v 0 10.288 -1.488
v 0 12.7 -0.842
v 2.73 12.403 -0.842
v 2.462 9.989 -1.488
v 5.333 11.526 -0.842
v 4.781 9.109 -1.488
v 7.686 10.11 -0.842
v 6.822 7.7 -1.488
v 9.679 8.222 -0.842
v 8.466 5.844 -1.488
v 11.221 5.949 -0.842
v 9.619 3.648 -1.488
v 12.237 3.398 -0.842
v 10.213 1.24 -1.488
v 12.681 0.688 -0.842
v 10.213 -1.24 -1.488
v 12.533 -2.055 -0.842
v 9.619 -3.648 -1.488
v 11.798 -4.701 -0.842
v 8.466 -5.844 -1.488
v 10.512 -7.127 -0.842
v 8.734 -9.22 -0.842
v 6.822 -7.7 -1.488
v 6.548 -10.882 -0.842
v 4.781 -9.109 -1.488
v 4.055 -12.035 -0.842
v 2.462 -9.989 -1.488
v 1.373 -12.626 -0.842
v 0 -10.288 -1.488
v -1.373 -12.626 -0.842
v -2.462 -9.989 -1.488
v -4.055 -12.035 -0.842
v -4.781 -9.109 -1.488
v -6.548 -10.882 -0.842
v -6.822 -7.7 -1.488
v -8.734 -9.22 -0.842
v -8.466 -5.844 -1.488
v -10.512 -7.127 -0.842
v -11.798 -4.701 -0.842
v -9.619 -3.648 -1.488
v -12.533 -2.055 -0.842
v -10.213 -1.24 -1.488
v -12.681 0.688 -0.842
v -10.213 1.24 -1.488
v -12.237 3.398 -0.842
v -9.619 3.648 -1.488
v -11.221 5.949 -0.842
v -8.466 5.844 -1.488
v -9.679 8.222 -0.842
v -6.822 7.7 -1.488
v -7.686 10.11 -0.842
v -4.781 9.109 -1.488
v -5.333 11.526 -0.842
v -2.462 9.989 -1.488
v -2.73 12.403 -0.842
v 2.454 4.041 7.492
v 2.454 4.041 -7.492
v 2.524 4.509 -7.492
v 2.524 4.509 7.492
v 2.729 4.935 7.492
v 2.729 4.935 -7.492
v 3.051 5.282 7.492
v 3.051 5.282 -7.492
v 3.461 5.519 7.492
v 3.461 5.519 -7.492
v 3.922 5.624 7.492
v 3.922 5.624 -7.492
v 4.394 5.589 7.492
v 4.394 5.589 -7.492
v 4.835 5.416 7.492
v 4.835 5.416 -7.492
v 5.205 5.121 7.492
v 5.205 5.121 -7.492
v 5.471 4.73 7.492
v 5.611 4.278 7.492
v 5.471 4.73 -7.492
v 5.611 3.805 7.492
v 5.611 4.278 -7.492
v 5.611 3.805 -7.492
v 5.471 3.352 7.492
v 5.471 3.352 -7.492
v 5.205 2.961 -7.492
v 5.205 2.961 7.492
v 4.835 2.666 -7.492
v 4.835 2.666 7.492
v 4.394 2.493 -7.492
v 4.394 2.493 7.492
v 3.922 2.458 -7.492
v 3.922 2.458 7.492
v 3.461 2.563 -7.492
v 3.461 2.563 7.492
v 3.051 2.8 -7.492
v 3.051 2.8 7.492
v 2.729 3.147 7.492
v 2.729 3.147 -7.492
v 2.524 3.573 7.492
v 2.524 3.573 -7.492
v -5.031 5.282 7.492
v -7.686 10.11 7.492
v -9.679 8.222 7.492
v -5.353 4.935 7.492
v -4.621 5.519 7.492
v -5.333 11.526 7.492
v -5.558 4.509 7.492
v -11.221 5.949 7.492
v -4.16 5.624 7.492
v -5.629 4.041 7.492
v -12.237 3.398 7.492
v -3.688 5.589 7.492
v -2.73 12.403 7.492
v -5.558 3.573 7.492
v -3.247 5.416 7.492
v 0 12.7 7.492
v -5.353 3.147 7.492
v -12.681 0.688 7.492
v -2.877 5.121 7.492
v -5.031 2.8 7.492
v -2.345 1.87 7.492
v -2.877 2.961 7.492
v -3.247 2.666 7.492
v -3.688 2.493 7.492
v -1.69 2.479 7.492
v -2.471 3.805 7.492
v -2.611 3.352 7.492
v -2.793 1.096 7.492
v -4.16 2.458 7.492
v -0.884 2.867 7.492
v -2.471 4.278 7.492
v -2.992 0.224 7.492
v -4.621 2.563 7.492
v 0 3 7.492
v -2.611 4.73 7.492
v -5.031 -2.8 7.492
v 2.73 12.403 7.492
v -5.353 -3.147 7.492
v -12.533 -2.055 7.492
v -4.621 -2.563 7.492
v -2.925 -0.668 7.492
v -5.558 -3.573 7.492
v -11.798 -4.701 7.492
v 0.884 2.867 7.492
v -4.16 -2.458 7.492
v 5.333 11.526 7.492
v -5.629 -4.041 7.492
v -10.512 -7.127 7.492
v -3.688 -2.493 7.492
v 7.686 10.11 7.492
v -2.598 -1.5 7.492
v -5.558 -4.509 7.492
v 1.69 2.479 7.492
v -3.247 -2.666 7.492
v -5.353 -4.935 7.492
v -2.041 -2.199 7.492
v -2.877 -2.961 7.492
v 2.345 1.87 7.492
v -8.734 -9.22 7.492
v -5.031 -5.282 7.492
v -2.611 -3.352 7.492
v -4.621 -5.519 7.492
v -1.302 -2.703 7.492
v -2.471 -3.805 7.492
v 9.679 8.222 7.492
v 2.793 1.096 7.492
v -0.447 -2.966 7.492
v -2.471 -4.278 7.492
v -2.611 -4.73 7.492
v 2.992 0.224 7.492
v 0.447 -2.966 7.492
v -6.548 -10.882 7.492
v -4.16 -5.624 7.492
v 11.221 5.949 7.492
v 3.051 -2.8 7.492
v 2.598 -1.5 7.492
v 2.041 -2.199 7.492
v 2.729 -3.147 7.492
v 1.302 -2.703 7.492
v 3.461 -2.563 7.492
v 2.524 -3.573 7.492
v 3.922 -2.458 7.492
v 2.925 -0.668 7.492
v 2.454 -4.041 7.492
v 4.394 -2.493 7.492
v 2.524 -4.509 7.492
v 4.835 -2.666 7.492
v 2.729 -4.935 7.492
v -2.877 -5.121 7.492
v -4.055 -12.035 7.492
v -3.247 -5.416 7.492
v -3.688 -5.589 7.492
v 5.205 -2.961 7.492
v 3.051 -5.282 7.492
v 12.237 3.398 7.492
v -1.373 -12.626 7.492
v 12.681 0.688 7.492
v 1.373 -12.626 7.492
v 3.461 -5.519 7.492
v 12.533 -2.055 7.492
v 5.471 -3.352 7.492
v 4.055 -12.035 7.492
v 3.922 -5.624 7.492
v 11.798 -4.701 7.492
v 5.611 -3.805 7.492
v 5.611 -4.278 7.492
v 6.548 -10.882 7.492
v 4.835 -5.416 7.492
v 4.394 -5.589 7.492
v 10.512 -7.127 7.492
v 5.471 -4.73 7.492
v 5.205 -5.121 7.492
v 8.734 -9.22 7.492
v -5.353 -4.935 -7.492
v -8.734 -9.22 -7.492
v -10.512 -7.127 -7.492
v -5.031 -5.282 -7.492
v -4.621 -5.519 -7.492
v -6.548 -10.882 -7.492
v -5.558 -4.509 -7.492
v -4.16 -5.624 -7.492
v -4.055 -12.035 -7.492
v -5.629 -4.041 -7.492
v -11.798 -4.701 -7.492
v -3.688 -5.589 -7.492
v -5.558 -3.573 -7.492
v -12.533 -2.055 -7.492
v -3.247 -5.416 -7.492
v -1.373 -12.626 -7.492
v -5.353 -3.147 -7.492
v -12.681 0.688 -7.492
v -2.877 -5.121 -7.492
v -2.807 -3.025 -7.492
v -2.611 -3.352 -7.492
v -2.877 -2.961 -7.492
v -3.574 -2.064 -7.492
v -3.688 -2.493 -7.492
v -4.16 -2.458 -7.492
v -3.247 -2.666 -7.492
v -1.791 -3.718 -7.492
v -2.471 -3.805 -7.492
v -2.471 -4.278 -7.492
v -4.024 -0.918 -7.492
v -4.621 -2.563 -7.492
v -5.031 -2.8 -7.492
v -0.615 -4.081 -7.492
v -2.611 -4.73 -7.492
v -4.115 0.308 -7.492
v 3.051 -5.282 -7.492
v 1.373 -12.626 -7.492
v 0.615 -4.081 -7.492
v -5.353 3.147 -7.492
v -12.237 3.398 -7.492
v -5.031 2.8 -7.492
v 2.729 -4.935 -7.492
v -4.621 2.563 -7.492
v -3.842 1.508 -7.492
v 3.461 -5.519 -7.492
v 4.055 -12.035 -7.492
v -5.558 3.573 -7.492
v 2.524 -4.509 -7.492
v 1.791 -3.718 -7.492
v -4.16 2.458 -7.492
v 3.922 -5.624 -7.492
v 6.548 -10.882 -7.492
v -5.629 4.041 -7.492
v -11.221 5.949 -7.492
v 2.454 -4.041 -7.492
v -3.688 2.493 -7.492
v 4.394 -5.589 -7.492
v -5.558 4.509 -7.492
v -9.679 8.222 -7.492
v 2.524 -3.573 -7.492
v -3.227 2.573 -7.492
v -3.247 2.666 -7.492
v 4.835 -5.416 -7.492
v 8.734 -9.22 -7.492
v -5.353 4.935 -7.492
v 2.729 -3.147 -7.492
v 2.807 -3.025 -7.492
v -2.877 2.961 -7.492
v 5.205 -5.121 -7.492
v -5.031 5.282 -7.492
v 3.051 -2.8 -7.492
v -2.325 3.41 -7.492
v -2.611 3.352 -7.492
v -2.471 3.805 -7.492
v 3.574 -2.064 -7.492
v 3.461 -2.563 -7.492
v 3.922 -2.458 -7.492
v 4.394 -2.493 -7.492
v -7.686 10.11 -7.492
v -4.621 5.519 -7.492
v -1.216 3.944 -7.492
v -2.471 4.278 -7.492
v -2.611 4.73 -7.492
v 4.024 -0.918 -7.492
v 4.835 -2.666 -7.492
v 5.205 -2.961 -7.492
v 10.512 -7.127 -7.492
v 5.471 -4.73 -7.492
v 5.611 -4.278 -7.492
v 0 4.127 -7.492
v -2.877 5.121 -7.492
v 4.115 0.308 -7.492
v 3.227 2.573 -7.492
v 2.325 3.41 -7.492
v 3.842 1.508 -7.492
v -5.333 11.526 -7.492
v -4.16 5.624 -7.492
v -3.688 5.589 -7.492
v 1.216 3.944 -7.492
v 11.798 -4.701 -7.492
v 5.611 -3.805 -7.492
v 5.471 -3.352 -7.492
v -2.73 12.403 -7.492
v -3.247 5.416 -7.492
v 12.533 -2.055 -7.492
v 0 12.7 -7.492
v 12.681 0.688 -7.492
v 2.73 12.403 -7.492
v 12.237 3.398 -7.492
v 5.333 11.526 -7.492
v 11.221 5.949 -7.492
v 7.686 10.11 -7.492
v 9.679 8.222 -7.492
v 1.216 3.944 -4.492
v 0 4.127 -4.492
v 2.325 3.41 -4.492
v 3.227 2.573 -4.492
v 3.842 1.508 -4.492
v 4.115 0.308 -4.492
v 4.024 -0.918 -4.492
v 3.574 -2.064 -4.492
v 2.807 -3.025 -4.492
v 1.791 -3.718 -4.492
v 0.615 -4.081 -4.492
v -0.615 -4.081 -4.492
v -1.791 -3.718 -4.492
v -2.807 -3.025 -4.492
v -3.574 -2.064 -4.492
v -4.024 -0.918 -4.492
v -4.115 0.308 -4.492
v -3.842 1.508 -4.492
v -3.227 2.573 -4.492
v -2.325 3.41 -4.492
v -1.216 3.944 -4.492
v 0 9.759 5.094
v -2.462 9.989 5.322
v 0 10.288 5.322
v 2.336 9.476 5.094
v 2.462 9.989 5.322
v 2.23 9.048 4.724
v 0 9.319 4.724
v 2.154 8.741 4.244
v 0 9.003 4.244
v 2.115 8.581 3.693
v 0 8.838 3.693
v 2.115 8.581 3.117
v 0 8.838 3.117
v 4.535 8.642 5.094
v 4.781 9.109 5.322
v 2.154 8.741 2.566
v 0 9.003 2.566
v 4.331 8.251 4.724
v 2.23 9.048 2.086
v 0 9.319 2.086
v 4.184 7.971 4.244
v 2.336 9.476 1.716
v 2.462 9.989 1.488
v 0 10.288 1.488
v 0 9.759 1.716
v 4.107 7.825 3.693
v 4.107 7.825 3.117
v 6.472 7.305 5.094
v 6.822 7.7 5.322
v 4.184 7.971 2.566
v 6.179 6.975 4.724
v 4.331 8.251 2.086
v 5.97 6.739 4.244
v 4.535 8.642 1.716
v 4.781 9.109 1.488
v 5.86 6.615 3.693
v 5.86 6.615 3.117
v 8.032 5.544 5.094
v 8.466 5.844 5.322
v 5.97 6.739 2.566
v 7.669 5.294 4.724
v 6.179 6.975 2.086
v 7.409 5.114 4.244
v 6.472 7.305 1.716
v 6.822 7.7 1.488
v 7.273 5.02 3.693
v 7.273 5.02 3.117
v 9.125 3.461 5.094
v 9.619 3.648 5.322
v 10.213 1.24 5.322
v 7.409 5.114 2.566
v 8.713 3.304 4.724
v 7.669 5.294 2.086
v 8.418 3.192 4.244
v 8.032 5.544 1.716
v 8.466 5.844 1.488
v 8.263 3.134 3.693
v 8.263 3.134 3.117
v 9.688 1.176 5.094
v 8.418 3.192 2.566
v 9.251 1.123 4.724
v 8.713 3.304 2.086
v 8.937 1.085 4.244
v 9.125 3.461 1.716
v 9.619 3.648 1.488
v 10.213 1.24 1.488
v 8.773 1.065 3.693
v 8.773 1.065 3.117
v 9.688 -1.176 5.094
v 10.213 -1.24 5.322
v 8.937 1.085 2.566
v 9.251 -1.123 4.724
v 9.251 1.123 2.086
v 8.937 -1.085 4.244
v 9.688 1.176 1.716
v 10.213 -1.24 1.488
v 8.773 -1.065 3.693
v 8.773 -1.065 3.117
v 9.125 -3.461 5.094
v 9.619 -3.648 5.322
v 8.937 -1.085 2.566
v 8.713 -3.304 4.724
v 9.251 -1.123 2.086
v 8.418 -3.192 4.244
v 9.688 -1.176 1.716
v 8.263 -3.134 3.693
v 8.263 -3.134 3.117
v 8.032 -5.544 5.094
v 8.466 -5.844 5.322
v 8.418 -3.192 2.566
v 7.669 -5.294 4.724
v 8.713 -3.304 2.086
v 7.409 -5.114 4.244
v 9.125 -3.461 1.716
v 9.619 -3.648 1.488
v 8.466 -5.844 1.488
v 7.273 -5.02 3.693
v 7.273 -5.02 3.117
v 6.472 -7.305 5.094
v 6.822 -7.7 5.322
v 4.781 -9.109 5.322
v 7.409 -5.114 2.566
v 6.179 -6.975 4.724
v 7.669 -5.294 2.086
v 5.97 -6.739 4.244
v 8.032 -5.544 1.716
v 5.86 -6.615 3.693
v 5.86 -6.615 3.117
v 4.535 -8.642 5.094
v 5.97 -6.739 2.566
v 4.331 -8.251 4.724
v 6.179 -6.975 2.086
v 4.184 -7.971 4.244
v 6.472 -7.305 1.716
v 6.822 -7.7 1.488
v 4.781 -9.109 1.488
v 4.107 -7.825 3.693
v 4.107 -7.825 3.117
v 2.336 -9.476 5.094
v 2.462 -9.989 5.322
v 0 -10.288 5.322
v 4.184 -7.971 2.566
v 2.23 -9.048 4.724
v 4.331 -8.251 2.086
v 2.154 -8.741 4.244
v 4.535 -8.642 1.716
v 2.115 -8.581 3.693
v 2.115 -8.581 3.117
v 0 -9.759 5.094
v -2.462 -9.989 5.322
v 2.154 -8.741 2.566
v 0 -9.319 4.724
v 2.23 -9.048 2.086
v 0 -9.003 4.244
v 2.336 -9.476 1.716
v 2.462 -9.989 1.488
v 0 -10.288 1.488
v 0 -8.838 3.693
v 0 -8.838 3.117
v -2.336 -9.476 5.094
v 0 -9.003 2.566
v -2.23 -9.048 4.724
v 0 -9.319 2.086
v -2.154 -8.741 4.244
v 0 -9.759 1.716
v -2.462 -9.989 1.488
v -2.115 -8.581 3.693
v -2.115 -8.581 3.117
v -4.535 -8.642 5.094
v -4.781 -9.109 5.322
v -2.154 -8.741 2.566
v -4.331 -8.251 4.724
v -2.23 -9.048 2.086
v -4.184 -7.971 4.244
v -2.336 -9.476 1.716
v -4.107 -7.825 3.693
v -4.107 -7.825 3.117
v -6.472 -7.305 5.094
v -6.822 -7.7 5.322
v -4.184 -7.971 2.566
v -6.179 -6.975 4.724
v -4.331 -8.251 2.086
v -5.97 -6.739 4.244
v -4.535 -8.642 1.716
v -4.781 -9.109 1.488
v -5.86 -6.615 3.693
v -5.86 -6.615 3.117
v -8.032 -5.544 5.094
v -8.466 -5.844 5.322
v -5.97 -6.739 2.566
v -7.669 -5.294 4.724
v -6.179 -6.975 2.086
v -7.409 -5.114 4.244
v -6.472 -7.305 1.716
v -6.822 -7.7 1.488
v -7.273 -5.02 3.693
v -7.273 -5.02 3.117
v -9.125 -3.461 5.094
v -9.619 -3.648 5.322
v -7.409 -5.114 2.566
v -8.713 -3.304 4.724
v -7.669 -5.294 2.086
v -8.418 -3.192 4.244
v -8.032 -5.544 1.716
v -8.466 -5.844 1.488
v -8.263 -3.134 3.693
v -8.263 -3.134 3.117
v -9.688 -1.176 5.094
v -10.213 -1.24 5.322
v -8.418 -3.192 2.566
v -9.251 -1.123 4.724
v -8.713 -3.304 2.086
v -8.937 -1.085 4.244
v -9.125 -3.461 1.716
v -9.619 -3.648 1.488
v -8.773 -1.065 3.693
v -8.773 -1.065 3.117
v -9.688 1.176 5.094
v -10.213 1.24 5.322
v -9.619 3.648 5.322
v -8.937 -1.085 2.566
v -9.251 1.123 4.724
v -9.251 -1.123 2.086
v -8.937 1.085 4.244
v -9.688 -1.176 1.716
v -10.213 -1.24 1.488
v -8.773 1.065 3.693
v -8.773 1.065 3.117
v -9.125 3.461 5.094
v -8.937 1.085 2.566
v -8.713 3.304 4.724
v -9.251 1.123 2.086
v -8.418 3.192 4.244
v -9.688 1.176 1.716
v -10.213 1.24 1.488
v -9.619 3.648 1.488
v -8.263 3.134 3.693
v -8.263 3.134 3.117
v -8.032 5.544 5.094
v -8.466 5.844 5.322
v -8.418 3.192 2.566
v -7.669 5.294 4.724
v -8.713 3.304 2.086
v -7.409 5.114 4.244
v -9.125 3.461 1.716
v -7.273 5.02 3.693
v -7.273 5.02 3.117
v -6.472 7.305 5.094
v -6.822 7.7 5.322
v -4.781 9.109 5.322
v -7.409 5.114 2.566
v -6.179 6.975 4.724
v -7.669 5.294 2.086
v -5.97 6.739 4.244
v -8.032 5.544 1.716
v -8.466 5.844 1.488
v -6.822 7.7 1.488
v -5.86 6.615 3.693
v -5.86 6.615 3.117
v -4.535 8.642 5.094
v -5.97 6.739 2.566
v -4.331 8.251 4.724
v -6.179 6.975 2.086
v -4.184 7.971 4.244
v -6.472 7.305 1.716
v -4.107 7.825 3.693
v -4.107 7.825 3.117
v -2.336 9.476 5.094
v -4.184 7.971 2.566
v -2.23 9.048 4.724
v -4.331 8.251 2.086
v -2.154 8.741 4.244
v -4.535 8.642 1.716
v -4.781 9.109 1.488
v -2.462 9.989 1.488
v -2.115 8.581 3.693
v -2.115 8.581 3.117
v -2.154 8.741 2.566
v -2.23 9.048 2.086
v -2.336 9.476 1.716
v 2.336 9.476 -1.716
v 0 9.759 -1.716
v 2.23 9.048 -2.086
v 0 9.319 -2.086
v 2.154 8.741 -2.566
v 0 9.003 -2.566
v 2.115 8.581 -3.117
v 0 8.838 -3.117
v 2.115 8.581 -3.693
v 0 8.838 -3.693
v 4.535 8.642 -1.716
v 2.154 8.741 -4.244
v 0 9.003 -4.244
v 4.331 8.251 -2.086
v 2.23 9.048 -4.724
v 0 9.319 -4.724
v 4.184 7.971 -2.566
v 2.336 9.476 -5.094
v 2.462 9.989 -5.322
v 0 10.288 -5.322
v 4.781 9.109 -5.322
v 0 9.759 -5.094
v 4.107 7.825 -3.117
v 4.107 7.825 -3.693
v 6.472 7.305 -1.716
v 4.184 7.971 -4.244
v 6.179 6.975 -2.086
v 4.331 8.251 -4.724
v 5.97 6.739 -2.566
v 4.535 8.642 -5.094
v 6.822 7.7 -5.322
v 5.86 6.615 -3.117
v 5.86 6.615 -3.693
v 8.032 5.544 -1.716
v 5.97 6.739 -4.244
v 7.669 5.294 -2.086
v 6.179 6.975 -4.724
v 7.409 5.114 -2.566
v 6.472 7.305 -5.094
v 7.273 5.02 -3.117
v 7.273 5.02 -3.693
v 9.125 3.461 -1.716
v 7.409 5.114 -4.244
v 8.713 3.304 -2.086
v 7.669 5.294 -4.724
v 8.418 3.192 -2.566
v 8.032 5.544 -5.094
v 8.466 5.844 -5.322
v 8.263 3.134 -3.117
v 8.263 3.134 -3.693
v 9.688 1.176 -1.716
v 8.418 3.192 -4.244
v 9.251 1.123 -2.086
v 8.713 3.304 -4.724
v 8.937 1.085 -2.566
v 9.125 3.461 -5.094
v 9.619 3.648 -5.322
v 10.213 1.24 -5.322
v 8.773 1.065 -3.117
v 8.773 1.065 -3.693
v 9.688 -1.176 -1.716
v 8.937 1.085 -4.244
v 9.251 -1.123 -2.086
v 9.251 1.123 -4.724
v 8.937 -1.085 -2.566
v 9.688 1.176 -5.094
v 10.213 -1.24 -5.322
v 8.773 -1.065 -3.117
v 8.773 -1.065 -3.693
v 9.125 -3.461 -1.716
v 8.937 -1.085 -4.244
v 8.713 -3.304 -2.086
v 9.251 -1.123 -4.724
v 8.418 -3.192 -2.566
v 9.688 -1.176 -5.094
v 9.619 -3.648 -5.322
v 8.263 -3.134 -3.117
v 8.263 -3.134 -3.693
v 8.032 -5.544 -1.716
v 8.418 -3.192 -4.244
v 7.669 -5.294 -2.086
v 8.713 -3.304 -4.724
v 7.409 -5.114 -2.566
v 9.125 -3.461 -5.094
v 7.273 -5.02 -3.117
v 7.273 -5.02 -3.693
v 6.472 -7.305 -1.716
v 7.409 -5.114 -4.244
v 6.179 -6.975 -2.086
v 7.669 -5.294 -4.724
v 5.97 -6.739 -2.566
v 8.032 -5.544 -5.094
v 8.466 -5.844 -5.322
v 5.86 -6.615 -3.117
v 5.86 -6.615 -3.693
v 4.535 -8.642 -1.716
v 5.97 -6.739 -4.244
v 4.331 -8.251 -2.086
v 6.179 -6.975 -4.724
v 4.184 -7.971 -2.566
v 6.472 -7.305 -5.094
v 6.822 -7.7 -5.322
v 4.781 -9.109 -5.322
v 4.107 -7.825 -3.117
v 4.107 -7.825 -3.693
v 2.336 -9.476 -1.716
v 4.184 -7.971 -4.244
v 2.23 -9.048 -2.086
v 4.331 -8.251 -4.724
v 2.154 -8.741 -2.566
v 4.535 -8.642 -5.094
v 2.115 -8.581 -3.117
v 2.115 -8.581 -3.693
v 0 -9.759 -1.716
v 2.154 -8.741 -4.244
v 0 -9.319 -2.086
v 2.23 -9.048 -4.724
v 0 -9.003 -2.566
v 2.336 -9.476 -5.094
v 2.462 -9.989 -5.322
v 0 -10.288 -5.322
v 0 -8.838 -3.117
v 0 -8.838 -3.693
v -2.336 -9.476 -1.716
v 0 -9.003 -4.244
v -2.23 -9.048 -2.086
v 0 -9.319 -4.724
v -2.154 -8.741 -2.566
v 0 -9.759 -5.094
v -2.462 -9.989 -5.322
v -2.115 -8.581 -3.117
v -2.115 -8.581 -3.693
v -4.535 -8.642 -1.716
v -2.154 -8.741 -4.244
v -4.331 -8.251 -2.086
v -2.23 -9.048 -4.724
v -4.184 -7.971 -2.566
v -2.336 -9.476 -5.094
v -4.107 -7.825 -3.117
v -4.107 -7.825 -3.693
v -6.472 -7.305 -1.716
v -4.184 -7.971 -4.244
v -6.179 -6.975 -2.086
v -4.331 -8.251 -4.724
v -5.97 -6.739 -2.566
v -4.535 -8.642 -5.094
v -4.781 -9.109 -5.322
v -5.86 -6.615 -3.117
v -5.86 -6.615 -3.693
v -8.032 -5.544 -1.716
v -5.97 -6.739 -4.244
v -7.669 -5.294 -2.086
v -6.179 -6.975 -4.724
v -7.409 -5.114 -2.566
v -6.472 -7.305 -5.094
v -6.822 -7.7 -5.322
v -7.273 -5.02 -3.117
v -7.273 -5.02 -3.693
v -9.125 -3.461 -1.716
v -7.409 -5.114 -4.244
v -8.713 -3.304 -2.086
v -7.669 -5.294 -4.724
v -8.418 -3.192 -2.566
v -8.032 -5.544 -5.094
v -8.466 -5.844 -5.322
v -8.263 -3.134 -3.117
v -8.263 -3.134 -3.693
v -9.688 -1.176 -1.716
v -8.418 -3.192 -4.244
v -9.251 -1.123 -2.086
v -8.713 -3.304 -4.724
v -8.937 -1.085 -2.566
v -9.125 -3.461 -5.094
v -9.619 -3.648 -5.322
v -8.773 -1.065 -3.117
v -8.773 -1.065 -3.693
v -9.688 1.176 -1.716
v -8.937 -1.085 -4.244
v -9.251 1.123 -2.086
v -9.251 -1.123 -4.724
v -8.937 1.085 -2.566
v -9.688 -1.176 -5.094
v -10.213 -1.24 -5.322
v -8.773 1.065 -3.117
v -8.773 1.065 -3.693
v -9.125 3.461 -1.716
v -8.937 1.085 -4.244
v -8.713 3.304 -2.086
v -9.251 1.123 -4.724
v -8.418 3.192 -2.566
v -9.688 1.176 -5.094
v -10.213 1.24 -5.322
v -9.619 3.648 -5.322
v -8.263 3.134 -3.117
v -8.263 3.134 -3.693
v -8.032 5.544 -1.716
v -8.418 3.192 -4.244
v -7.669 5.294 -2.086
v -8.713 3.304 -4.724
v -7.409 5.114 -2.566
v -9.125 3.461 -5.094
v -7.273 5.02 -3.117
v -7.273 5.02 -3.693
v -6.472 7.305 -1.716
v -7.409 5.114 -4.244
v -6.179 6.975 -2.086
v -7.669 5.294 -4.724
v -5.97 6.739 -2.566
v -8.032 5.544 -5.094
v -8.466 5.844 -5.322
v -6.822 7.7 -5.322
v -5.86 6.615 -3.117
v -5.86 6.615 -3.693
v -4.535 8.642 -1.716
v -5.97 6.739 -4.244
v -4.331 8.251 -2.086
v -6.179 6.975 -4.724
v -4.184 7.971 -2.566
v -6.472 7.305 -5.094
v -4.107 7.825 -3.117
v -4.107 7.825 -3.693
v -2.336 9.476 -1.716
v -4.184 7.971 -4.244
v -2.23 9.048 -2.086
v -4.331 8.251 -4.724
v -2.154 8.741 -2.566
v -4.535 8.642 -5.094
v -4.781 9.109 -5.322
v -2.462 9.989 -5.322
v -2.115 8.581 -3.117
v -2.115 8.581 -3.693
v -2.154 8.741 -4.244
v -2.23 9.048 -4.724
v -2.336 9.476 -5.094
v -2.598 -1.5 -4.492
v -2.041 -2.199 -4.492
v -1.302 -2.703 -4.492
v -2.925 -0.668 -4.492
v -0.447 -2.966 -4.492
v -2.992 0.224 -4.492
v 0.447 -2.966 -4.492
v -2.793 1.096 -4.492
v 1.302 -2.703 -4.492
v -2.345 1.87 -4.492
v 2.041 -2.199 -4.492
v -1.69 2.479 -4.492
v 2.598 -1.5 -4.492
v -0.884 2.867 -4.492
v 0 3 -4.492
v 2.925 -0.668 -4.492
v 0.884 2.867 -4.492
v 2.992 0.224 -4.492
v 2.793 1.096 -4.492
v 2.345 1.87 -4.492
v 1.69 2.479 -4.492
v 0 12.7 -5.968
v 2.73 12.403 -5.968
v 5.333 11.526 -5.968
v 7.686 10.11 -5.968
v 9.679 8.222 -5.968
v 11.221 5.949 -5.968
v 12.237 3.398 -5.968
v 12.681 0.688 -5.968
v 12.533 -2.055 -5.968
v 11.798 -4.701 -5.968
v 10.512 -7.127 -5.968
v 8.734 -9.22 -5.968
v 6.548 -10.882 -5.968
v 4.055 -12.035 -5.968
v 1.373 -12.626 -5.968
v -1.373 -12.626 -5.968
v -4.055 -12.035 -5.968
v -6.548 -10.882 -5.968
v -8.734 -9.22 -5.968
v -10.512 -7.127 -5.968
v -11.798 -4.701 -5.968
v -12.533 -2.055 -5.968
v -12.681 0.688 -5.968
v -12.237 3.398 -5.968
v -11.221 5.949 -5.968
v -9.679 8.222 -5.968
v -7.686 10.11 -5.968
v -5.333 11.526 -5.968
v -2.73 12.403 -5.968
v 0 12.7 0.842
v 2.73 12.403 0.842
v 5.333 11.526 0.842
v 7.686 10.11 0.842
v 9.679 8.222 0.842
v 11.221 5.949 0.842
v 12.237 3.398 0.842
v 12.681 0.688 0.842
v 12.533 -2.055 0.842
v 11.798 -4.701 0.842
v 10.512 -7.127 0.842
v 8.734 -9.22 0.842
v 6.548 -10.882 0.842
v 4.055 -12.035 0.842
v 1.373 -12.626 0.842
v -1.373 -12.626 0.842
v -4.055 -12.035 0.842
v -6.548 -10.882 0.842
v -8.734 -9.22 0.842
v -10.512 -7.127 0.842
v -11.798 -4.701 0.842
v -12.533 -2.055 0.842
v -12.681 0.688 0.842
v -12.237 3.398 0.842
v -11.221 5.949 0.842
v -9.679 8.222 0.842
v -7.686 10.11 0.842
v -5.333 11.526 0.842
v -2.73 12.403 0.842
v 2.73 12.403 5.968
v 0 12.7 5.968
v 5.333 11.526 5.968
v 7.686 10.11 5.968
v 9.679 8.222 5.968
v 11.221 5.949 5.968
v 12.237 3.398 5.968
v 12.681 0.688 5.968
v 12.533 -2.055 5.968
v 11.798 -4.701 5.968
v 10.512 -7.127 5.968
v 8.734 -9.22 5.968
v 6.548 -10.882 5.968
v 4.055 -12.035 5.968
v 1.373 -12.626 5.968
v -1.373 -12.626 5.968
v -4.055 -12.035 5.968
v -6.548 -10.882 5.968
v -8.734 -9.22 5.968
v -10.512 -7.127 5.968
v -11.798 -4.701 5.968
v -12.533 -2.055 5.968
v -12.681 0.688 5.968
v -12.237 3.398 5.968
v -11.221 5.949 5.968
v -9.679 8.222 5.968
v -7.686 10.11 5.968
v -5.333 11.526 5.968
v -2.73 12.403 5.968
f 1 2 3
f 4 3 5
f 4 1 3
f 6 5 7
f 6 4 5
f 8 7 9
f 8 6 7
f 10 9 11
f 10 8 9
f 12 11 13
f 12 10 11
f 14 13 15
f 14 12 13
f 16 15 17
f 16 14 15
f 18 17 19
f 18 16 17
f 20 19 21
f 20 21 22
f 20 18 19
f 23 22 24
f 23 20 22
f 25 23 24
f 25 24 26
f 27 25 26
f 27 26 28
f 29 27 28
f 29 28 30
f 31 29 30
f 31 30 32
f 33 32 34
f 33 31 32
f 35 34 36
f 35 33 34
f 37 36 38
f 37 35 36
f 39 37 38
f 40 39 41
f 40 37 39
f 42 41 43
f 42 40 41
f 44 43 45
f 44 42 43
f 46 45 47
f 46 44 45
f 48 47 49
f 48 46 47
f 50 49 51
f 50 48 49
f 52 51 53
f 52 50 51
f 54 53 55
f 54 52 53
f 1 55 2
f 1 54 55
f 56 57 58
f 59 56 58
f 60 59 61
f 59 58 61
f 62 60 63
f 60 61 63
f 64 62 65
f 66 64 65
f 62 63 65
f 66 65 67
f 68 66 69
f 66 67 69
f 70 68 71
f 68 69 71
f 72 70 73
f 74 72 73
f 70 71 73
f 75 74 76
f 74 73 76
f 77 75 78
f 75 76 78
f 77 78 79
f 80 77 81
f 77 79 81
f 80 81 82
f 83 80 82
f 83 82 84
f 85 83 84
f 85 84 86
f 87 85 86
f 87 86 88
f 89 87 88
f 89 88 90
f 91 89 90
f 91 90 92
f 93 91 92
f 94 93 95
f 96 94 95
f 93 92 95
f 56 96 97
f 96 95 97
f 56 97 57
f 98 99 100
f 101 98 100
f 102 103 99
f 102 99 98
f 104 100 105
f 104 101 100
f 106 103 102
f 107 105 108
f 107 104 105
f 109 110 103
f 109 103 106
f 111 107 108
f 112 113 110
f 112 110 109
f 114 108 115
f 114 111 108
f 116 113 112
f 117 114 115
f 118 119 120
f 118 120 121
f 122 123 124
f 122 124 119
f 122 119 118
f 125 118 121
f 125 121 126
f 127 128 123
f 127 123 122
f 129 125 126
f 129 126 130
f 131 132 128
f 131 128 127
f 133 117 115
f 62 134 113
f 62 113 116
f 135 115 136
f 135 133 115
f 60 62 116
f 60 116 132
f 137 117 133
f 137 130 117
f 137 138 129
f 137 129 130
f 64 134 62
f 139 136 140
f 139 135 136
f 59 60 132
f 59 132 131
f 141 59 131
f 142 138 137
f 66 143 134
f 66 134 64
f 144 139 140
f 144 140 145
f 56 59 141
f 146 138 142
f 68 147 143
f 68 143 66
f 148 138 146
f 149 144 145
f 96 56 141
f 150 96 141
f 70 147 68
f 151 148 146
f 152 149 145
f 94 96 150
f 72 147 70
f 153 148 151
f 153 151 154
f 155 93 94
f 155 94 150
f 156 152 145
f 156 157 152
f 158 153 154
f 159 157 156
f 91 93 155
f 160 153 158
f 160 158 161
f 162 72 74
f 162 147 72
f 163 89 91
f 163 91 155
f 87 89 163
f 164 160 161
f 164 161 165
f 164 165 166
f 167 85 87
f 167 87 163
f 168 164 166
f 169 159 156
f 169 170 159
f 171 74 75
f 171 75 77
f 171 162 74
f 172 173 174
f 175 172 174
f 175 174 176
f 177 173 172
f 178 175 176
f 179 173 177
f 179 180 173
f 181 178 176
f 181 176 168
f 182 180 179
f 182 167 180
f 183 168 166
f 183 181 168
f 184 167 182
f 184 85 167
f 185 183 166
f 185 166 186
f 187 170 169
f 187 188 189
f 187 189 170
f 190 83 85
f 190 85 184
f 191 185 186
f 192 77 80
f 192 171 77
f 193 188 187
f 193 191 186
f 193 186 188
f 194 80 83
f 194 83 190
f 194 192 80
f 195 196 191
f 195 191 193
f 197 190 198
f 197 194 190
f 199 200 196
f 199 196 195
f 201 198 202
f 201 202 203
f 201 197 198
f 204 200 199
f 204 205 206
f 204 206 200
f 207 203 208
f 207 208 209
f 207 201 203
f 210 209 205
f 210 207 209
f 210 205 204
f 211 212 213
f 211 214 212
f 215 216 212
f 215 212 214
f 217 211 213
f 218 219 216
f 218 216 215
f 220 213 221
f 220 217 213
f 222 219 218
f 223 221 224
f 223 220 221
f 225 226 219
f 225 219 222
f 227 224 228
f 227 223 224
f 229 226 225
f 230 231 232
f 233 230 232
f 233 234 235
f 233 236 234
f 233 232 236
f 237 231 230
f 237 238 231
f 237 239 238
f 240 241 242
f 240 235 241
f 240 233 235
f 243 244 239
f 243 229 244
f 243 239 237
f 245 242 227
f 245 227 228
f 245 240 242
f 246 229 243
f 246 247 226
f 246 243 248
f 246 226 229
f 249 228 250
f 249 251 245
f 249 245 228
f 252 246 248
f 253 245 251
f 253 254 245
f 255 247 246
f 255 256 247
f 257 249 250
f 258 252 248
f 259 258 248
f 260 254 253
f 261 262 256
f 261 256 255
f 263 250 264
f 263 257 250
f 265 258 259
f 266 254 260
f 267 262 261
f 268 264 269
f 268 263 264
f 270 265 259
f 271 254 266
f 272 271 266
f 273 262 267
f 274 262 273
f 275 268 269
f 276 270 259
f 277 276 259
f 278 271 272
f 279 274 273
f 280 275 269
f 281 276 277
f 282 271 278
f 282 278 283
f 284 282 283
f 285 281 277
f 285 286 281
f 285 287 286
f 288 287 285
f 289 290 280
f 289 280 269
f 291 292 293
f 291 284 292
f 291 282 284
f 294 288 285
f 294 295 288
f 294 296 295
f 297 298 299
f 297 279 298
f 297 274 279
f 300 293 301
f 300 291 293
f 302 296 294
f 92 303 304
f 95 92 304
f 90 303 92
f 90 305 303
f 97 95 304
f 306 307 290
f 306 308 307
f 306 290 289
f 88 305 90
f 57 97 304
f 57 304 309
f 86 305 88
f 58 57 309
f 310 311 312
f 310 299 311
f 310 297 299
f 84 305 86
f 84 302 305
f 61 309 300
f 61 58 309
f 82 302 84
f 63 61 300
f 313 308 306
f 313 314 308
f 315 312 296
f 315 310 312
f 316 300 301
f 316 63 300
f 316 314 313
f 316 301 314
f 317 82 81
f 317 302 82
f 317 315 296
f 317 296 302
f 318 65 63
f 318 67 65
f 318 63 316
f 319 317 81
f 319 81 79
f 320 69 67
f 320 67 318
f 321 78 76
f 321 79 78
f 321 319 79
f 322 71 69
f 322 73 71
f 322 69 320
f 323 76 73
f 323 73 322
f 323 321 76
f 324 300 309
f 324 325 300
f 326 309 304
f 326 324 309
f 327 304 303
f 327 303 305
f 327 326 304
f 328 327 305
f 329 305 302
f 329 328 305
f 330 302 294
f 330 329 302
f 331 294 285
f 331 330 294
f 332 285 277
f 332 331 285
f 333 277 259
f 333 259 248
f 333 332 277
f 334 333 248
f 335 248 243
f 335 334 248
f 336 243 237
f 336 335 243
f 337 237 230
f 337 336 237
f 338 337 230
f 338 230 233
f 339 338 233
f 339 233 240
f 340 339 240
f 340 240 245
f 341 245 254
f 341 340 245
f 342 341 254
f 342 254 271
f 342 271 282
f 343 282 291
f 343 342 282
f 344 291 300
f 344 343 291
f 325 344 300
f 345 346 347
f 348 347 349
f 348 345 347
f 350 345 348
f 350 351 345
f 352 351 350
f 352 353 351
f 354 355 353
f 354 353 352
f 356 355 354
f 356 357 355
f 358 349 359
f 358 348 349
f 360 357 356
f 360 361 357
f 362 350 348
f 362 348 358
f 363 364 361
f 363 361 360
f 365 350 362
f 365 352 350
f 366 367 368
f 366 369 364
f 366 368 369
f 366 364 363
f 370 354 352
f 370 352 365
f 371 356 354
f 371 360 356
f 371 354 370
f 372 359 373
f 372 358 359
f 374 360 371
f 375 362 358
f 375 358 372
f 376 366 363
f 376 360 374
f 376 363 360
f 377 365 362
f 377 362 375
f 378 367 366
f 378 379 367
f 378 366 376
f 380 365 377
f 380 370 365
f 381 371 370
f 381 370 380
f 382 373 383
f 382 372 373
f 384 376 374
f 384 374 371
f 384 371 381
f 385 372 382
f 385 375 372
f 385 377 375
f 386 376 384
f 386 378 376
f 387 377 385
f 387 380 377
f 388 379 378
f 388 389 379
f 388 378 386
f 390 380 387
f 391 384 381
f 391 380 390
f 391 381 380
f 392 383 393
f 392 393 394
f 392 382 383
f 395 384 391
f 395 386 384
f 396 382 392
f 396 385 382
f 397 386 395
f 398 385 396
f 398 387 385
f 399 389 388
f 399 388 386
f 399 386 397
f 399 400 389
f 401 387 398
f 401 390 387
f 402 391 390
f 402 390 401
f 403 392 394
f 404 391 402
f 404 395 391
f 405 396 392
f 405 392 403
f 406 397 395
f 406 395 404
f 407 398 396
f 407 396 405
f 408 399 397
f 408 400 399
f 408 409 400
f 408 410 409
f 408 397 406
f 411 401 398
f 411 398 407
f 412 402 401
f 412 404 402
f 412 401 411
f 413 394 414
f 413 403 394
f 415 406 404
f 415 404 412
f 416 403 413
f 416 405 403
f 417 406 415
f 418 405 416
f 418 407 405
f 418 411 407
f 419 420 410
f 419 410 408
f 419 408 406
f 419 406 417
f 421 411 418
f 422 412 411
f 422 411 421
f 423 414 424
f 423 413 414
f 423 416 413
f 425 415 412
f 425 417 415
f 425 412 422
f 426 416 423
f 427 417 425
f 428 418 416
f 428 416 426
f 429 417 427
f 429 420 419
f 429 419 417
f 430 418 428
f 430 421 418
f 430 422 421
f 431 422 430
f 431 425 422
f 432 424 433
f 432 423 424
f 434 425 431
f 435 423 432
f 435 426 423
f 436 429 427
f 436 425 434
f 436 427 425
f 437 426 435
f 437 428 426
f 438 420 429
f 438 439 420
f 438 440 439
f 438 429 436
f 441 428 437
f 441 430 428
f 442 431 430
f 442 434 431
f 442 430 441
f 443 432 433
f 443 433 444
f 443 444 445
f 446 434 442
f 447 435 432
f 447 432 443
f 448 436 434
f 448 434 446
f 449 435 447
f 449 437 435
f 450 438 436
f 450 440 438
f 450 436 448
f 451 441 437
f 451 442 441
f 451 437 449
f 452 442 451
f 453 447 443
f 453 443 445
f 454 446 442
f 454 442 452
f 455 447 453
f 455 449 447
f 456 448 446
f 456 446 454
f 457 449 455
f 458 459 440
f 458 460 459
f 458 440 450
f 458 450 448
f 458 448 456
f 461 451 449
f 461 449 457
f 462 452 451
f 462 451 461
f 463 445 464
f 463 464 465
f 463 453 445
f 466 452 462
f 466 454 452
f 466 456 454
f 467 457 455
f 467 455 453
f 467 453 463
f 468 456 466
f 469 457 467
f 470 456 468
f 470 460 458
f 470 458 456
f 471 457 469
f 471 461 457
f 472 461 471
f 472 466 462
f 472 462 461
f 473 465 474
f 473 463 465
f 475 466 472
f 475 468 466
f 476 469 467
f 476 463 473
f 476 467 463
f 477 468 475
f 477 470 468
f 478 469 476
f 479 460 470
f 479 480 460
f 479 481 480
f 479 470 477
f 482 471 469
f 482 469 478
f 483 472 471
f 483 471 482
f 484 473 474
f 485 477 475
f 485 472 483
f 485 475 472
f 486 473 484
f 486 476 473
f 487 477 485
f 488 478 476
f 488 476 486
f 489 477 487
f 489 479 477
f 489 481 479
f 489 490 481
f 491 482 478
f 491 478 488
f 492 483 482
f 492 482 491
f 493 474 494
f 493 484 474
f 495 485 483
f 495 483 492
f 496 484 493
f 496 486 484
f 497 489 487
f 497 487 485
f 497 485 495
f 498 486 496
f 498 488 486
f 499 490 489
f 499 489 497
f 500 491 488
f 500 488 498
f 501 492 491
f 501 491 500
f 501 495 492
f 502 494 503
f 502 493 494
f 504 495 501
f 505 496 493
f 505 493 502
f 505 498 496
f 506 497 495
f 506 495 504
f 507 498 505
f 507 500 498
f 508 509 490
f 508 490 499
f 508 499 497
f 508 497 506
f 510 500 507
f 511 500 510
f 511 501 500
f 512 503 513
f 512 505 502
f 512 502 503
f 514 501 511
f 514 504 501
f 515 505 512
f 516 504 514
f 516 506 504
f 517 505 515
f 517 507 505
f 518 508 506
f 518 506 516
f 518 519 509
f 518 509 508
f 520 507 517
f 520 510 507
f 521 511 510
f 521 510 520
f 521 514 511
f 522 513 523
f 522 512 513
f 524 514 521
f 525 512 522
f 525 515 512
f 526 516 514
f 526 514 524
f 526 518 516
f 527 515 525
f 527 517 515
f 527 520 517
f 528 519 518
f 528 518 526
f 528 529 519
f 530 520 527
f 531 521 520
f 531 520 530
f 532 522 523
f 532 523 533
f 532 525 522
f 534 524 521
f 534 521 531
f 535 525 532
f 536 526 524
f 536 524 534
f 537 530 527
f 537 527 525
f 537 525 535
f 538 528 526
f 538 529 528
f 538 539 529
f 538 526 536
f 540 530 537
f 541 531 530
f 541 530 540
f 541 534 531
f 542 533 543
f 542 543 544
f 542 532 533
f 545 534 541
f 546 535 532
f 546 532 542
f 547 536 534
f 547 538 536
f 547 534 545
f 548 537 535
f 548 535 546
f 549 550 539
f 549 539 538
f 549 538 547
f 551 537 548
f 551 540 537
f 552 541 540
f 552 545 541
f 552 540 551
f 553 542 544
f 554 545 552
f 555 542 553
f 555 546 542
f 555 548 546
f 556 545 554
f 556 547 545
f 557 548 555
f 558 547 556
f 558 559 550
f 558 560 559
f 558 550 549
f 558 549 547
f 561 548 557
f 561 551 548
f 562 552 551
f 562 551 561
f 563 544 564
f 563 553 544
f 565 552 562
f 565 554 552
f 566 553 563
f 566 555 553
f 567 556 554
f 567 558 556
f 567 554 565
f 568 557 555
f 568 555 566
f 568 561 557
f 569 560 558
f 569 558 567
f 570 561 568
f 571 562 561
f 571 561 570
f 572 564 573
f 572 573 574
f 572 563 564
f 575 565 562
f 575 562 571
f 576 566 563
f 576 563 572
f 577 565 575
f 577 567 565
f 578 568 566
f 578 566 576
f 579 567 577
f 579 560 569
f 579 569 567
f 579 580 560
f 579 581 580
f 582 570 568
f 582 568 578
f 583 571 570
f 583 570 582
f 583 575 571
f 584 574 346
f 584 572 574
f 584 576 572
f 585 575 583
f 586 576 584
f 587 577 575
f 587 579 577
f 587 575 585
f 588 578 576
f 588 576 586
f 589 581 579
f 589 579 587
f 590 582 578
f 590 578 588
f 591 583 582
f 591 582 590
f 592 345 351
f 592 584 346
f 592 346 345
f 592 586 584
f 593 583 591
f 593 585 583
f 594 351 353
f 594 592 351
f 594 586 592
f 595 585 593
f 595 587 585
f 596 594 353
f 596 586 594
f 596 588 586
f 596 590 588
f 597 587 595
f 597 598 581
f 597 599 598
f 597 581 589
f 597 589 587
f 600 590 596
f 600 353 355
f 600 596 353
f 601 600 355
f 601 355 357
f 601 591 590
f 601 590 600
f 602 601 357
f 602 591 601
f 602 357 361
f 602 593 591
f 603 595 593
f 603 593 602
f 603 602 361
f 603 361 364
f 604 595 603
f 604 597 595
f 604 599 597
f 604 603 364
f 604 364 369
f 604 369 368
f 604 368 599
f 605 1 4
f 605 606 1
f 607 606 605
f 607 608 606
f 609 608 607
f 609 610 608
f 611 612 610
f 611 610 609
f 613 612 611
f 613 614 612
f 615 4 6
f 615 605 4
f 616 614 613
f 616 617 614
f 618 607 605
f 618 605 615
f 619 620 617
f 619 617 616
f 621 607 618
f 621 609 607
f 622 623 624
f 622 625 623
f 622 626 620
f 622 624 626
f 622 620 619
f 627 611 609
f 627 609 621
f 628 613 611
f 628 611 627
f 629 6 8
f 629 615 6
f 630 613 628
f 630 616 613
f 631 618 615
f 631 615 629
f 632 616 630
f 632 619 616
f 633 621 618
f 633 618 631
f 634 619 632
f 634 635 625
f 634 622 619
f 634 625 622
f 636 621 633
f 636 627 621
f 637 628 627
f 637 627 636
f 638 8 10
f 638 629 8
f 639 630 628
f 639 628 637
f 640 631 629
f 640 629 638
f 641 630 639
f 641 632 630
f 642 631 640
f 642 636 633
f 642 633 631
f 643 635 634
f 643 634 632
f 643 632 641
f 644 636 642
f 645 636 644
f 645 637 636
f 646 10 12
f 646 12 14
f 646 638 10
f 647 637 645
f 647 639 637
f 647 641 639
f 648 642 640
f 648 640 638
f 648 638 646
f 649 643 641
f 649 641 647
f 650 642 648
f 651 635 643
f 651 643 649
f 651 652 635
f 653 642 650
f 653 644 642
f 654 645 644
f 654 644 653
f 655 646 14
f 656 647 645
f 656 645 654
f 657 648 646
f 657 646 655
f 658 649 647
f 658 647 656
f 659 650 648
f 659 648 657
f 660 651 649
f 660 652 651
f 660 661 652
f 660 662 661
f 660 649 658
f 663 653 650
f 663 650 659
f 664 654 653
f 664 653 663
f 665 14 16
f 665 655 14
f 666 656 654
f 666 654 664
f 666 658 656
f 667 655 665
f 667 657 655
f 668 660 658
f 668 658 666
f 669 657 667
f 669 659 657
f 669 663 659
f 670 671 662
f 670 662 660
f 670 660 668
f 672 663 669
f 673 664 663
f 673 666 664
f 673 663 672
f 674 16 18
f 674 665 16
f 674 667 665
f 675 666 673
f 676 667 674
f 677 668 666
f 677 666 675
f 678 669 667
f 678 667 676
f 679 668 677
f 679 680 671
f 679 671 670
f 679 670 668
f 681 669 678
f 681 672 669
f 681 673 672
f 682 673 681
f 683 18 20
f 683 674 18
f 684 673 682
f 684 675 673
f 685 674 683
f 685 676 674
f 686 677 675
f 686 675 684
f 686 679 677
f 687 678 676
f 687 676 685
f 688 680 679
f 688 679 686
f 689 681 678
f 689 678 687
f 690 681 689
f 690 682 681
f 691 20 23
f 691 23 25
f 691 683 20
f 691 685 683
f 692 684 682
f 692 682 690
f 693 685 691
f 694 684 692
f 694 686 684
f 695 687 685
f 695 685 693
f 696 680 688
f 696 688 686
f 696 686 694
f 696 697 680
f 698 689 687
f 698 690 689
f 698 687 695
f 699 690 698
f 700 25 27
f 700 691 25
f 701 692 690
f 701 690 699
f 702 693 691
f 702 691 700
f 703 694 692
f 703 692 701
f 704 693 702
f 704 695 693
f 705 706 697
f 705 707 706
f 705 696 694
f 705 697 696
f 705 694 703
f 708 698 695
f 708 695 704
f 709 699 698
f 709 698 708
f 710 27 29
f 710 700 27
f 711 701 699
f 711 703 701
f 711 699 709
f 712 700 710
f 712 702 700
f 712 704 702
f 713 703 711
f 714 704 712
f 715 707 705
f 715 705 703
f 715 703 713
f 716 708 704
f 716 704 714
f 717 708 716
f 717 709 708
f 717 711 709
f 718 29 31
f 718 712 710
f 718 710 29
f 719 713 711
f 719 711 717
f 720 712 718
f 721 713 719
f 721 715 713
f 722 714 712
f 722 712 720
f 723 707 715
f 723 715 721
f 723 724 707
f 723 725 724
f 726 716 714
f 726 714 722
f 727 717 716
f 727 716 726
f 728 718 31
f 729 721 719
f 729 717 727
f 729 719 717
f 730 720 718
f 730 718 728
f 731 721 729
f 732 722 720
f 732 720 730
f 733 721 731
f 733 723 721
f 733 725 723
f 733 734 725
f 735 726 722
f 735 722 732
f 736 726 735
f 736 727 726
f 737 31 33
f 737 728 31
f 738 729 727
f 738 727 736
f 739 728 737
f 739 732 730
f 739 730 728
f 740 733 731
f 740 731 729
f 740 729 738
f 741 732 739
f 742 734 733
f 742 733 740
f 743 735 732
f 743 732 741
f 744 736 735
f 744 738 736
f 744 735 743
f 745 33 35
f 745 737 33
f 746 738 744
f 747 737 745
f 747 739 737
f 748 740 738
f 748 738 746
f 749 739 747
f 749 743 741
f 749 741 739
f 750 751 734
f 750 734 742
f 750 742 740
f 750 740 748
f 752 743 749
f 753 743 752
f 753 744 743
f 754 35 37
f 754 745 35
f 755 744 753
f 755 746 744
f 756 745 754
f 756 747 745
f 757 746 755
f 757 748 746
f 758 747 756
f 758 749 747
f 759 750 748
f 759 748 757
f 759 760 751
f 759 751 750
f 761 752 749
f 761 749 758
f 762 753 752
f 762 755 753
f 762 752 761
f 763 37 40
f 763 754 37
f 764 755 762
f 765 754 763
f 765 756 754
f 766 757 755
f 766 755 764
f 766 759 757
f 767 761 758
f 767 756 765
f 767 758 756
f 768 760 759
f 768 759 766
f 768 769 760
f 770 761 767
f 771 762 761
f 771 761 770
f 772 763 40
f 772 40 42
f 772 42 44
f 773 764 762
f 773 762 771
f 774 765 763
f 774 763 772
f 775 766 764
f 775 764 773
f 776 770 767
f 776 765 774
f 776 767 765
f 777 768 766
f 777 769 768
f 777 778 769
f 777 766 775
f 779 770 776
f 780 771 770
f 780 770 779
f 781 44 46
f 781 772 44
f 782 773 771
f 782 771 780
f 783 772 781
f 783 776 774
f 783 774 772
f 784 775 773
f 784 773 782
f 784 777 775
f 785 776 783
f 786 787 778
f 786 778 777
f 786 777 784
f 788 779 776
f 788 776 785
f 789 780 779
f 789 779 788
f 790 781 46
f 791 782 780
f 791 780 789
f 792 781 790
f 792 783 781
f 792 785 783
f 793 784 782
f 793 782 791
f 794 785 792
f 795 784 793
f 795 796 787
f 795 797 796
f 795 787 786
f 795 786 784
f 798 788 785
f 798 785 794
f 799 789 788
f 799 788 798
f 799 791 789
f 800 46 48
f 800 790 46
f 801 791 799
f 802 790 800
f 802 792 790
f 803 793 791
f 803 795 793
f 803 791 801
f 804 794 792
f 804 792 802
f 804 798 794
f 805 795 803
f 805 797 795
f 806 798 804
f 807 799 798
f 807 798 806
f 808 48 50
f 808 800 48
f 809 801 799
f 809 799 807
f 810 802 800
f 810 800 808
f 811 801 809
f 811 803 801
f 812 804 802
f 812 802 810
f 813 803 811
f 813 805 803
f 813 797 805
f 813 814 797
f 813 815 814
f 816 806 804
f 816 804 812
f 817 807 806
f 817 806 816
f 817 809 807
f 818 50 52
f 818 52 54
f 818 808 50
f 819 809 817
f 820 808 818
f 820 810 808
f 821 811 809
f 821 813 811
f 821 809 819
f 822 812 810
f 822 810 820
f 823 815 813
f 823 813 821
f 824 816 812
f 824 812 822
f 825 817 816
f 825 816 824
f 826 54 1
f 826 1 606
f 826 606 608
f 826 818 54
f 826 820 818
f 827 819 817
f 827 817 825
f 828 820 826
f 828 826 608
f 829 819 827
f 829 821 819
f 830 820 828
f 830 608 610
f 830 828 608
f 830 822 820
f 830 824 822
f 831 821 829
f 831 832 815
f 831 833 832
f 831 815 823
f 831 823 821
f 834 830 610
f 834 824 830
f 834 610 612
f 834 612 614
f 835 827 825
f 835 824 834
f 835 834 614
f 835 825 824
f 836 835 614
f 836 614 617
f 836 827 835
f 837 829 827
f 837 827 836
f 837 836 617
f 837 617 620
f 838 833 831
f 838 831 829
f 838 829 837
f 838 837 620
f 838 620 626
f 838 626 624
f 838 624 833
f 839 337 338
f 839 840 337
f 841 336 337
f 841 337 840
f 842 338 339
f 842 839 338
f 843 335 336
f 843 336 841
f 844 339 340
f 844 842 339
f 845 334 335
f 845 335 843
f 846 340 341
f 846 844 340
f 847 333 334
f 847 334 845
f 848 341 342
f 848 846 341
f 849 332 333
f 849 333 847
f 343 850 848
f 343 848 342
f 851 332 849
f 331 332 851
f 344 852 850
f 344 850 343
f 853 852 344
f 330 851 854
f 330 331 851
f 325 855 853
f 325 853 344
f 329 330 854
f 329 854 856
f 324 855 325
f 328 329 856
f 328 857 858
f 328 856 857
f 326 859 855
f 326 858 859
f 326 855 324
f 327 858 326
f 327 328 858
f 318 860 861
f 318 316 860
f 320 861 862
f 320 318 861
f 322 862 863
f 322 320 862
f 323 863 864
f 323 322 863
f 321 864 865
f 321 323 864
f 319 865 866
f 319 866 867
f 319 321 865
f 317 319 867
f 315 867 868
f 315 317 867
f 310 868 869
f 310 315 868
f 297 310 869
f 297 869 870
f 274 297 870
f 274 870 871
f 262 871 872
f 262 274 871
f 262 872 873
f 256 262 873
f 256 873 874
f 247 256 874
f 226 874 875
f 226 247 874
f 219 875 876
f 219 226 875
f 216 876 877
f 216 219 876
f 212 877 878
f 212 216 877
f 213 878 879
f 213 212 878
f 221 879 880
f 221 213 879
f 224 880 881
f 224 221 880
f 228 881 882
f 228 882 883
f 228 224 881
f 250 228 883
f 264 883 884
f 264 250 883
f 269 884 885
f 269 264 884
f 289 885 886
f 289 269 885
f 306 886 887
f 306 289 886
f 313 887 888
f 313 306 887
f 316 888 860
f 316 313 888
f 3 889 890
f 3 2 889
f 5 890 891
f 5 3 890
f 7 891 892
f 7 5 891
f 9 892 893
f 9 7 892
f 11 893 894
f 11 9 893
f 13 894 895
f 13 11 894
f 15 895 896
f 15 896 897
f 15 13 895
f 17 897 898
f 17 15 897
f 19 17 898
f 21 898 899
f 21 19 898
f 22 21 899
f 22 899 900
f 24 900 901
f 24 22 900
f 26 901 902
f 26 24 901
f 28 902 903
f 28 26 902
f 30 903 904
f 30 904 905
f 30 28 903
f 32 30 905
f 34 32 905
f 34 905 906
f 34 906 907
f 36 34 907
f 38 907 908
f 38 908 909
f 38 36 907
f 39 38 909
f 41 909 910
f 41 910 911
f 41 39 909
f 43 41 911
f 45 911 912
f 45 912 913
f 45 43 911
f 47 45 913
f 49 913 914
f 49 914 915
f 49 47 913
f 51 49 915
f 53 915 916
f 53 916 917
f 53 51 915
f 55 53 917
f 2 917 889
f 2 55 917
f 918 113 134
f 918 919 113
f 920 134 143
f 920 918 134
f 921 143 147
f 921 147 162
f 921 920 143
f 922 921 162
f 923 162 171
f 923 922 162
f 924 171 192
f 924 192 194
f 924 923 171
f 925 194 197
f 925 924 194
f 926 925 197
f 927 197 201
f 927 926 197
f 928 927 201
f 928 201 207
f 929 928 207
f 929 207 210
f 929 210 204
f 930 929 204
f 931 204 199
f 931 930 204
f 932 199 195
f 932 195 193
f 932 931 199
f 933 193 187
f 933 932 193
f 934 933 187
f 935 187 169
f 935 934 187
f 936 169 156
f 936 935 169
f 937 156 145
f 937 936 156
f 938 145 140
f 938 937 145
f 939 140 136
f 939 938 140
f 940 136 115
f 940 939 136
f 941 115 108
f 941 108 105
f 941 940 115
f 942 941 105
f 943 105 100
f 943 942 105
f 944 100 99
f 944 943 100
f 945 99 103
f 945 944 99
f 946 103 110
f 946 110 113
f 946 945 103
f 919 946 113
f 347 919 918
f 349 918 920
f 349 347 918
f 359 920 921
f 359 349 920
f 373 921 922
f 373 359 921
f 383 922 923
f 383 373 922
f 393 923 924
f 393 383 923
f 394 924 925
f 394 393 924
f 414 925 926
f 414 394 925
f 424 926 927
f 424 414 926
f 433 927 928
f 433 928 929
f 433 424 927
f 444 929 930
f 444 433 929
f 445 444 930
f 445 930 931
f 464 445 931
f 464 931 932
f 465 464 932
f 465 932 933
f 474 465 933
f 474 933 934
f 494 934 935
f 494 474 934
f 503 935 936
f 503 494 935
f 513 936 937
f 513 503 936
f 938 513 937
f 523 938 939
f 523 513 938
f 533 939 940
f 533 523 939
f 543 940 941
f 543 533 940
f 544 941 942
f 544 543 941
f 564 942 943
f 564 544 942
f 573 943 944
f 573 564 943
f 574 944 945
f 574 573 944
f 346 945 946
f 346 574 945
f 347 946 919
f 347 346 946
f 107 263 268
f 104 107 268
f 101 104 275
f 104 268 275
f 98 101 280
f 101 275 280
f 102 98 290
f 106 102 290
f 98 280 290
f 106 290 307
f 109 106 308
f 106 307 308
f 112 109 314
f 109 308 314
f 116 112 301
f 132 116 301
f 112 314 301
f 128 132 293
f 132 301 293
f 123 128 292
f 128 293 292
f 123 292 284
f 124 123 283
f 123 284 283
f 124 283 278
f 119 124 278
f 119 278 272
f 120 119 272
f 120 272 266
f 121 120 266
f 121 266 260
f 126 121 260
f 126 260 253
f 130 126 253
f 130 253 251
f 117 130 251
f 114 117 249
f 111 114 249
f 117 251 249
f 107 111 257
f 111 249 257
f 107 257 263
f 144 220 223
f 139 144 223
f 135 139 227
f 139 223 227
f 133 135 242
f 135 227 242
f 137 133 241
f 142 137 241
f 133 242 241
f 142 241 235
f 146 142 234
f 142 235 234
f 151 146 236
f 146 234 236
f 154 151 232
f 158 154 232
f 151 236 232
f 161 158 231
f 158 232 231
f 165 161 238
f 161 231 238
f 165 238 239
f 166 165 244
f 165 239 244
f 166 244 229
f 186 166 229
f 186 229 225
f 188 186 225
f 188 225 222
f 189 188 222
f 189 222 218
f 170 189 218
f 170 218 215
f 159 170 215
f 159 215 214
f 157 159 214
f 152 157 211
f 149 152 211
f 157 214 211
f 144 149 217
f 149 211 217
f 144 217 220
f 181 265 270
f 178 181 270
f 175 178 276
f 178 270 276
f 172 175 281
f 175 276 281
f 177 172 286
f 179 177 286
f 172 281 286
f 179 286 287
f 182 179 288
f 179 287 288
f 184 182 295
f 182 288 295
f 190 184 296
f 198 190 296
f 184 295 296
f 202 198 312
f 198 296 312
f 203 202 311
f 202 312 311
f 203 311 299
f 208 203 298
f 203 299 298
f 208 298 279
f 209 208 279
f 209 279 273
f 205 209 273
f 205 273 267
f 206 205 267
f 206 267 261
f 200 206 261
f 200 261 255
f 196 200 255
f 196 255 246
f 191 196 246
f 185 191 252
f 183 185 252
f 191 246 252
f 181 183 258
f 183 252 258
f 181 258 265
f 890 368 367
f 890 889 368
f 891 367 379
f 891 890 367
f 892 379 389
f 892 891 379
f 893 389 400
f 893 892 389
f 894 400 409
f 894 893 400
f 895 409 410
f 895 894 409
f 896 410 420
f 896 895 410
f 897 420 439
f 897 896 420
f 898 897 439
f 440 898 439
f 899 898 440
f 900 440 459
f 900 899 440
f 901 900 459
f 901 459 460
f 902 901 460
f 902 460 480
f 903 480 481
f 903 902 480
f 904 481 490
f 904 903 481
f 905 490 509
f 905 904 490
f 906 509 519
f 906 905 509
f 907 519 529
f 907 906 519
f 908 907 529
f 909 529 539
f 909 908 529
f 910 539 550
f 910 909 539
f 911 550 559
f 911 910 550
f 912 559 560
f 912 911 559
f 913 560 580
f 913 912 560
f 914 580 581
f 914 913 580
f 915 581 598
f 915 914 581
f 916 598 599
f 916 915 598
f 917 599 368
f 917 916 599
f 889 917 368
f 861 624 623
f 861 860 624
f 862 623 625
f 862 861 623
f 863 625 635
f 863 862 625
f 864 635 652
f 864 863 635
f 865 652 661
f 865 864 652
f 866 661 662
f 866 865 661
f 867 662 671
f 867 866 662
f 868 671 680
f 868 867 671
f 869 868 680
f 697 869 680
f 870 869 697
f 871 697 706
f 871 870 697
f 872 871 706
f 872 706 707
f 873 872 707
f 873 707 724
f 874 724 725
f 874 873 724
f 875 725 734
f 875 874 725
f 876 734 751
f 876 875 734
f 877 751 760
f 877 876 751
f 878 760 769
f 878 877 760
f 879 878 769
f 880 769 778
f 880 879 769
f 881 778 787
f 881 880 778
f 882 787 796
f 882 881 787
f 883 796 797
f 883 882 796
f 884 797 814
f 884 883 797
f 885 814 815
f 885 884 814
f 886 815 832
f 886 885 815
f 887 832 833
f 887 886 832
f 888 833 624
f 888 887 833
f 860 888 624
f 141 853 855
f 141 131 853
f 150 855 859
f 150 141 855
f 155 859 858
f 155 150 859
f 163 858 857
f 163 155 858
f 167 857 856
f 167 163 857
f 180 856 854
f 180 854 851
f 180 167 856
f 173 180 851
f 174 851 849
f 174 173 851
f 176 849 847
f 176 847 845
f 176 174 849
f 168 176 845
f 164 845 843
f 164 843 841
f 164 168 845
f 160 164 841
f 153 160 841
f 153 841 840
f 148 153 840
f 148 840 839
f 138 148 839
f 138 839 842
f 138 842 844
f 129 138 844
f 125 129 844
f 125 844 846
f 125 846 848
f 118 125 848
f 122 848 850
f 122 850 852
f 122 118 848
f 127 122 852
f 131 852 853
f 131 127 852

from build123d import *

# Parameters (mm, degrees)
SKETCH2_R          = 1.5875
CUT_EXTRUDE1_DEPTH = 14.984431


with BuildPart() as part:
    # Sketch1 → Revolve1 (revolve)
    with BuildSketch(Plane(origin=(0, 0, 0), x_dir=(0, 0, -1), z_dir=(1, 0, 0))):
        with BuildLine():
            Line((-1.488284524, 10.287553907), (-0.841871541, 12.7))
            Line((-0.841871541, 12.7), (0.841871541, 12.7))
            Line((0.841871541, 12.7), (1.488284524, 10.287553907))
            ThreePointArc((1.488284524, 10.287553907), (3.405043585, 8.81677295), (5.321802647, 10.287553907))
            Line((5.321802647, 10.287553907), (5.968215629, 12.7))
            Line((5.968215629, 12.7), (7.492215629, 12.7))
            Line((7.492215629, 12.7), (7.492215629, 4.127000001))
            Line((7.492215629, 4.127000001), (4.492215629, 4.127000001))
            Line((4.492215629, 4.127000001), (4.492215629, 3))
            Line((4.492215629, 3), (-7.492215629, 3))
            Line((-7.492215629, 3), (-7.492215629, 12.7))
            Line((-7.492215629, 12.7), (-5.968215629, 12.7))
            Line((-5.968215629, 12.7), (-5.321802647, 10.287553907))
            ThreePointArc((-5.321802647, 10.287553907), (-3.405043585, 8.81677295), (-1.488284524, 10.287553907))
        make_face()
    revolve(axis=Axis((0, 0, 0), (0, 0, -1)))

    # Sketch2 → Cut-Extrude1 (cut)
    with BuildSketch(Plane(origin=(0, 0, -7.492215629), x_dir=(-1, 0, 0), z_dir=(0, 0, -1))):
        with Locations((4.041115254, 4.041115254)):
            Circle(SKETCH2_R)
        with Locations((-4.041115254, 4.041115254)):
            Circle(SKETCH2_R)
        with Locations((-4.041115254, -4.041115254)):
            Circle(SKETCH2_R)
        with Locations((4.041115254, -4.041115254)):
            Circle(SKETCH2_R)
    extrude(amount=-CUT_EXTRUDE1_DEPTH, mode=Mode.SUBTRACT)


solid = part.part
